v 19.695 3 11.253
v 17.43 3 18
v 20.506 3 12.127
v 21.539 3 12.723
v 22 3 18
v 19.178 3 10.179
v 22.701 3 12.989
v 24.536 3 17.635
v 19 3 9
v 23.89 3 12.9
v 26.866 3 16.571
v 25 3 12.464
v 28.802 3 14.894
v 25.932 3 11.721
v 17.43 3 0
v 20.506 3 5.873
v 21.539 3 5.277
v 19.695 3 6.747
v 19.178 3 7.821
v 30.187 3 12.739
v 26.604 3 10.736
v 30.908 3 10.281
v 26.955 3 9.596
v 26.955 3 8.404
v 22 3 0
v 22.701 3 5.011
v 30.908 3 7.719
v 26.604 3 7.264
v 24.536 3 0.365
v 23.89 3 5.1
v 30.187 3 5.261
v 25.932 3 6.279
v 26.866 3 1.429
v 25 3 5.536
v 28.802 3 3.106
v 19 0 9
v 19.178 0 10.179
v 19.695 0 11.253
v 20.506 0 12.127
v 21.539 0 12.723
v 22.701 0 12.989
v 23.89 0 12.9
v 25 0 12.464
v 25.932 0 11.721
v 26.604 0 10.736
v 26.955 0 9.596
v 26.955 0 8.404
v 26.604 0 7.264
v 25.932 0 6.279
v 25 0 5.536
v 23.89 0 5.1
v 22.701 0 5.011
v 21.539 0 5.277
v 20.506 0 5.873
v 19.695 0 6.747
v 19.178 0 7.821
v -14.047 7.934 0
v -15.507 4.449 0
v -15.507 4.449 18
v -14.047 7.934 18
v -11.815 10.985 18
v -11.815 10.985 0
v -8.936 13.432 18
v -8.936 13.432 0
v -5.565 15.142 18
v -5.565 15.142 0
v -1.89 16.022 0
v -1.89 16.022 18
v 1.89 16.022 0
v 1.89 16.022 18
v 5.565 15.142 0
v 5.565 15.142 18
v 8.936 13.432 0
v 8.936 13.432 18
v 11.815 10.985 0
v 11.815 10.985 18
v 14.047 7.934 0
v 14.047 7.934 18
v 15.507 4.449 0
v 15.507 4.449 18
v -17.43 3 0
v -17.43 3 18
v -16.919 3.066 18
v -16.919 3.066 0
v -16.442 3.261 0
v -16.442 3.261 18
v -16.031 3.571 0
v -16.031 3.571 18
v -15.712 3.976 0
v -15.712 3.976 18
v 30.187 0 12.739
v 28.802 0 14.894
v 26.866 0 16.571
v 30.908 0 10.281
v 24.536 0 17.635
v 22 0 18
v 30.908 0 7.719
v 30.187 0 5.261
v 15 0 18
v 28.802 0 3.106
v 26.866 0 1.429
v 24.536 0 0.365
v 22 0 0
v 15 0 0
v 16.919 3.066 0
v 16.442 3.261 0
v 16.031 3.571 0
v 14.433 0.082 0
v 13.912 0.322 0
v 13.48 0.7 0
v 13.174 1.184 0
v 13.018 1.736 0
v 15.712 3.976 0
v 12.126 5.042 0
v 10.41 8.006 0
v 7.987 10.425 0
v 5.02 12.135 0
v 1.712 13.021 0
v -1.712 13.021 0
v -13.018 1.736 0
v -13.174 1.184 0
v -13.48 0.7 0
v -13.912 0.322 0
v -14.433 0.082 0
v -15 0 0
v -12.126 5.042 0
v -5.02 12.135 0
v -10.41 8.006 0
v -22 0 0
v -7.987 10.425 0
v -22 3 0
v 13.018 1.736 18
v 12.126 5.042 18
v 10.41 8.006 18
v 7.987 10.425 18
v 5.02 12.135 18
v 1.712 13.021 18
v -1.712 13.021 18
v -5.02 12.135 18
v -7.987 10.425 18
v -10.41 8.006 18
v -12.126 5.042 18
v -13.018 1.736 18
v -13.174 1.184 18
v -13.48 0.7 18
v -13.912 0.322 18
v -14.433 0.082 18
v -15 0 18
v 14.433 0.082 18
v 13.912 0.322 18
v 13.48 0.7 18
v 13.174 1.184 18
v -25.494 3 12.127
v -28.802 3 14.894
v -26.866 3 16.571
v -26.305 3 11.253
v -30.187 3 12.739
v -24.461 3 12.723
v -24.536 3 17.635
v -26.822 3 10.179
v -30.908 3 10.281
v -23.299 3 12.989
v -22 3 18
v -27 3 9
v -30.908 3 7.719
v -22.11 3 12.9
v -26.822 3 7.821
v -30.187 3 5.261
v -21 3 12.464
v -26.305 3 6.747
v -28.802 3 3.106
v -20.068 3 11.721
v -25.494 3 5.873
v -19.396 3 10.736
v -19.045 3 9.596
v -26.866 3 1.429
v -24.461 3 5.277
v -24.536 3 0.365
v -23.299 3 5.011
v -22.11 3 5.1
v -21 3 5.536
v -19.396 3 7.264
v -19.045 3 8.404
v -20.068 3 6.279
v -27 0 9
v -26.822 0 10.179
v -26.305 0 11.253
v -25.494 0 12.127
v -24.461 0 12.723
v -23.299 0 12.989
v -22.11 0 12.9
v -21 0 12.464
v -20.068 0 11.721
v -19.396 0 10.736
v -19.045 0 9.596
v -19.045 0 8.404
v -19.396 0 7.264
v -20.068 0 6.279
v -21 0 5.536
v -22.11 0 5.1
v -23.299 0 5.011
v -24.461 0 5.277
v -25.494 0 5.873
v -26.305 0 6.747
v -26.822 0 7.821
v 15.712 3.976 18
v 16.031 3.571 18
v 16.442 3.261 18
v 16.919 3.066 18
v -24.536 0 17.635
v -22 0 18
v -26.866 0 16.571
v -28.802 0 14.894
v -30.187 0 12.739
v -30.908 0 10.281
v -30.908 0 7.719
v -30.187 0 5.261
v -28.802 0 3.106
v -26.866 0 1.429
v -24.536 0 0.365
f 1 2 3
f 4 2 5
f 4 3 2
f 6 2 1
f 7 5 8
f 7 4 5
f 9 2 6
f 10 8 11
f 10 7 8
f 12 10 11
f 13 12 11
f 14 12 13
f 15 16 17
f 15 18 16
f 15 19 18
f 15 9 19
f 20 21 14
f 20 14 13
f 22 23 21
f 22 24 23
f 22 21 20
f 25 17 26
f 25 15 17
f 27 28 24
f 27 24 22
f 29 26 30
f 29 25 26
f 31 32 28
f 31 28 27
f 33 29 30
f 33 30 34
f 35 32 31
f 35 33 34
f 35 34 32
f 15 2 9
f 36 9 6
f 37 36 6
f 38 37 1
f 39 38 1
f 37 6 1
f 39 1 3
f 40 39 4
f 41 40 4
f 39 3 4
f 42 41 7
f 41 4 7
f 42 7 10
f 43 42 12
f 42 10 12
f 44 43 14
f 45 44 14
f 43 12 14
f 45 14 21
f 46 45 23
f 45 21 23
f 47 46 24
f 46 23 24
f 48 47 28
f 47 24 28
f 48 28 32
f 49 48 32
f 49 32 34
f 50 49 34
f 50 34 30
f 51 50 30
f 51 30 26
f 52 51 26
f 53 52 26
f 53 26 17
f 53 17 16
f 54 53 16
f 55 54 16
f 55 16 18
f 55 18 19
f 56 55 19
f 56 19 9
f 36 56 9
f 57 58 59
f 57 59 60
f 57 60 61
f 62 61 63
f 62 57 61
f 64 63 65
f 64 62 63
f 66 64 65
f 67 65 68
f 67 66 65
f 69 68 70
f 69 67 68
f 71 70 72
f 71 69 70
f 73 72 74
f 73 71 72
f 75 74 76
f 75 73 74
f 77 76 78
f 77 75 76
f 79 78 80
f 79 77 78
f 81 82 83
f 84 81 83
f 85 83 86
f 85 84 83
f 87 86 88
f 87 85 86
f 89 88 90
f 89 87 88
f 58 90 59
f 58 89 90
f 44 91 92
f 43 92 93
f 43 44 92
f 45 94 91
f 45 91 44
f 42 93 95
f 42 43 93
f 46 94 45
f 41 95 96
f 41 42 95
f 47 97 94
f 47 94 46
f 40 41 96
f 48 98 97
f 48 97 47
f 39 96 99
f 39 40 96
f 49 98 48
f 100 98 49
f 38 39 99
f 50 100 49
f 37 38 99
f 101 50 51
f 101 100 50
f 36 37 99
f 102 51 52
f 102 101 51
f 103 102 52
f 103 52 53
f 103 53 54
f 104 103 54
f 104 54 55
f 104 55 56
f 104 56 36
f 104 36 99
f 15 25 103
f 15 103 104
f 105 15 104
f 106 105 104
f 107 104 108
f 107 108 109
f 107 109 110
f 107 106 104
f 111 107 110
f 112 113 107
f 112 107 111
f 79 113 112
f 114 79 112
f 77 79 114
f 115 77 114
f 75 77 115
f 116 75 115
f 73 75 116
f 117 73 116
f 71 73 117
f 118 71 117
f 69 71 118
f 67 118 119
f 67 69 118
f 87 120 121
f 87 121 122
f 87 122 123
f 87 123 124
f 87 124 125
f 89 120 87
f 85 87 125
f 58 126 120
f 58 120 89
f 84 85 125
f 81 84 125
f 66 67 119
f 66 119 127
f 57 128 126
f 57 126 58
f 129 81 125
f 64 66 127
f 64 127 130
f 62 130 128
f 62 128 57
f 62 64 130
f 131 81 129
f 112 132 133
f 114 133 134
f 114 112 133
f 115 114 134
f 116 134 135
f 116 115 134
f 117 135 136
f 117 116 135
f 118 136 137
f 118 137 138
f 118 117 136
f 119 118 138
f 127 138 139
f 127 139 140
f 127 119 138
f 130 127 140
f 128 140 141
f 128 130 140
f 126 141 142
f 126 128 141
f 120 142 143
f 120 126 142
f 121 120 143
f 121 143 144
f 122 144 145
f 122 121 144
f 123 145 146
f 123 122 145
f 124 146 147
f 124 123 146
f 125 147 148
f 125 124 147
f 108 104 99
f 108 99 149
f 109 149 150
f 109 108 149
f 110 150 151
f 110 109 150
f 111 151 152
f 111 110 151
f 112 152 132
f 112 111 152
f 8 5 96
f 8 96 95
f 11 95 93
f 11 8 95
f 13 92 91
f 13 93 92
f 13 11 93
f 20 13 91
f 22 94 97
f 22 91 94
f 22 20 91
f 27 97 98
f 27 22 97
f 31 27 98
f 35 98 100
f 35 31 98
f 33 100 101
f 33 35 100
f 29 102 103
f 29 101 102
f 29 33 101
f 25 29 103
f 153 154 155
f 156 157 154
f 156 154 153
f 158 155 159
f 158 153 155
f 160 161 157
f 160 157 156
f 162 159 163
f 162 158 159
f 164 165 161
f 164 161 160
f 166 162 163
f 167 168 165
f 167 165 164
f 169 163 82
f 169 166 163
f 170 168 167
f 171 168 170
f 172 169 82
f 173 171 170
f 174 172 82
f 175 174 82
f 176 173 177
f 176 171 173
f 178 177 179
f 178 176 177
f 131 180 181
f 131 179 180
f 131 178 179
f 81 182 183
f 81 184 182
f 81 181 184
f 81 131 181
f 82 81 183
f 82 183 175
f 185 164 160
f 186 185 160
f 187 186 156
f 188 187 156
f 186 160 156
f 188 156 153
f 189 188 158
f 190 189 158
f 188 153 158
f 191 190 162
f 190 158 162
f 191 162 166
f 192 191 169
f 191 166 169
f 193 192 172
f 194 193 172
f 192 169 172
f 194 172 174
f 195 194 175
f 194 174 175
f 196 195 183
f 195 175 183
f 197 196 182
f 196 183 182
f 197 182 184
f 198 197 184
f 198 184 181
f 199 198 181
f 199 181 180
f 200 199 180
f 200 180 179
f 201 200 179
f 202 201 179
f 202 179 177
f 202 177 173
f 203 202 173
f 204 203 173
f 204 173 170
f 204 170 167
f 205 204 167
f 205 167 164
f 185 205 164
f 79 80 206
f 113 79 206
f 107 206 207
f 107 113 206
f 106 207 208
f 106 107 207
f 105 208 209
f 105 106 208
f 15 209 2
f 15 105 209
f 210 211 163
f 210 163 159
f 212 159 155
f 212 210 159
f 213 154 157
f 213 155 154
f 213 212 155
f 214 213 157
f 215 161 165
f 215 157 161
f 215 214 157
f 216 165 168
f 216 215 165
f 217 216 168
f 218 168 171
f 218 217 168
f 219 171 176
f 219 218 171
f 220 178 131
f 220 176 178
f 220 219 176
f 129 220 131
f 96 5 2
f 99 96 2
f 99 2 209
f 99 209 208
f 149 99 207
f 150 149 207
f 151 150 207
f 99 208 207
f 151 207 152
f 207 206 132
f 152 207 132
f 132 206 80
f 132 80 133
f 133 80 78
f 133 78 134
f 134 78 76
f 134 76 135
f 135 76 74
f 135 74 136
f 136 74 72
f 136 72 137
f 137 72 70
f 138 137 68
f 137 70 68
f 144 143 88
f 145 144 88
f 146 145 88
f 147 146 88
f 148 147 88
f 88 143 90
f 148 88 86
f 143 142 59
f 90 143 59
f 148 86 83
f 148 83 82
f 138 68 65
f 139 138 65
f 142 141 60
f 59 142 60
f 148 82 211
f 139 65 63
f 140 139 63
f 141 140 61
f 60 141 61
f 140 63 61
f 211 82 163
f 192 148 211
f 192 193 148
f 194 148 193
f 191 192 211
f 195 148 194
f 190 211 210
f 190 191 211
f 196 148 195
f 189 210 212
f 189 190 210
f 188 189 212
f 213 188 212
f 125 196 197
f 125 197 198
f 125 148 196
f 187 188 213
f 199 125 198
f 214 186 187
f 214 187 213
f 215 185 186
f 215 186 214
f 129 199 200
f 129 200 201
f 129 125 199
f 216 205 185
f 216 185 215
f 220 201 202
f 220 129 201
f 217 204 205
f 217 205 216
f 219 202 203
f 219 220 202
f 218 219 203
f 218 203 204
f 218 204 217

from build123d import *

# Parameters (mm, degrees)
BOSS_EXTRUDE1_DEPTH = 18
CUT_EXTRUDE1_REACH  = 40.177
SKETCH2_R           = 4
FILLET2_RADIUS      = 9
FILLET2_LENGTH      = 3
FILLET3_RADIUS      = 9
FILLET3_LENGTH      = 3


with BuildPart() as part:
    # Sketch1 → Boss-Extrude1 (new body)
    with BuildSketch(Plane.XY):
        with BuildLine():
            Line((31, 0), (15, 0))
            ThreePointArc((15, 0), (13.682550737, 0.495231765), (13.017544199, 1.73567256))
            ThreePointArc((13.017544199, 1.73567256), (0, 13.13274595), (-13.017544199, 1.73567256))
            ThreePointArc((-13.017544199, 1.73567256), (-13.682550737, 0.495231765), (-15, 0))
            Line((-15, 0), (-31, 0))
            Line((-31, 0), (-31, 3))
            Line((-31, 3), (-17.429758337, 3))
            ThreePointArc((-17.429758337, 3), (-16.226217084, 3.402662073), (-15.507296248, 4.448511548))
            ThreePointArc((-15.507296248, 4.448511548), (0, 16.13274595), (15.507296248, 4.448511548))
            ThreePointArc((15.507296248, 4.448511548), (16.226217084, 3.402662073), (17.429758337, 3))
            Line((17.429758337, 3), (31, 3))
            Line((31, 3), (31, 0))
        make_face()
    extrude(amount=BOSS_EXTRUDE1_DEPTH)

    # Sketch2 → Cut-Extrude1 (cut, up to next)
    with BuildSketch(Plane(origin=(0, 3, 0), x_dir=(1, 0, 0), z_dir=(0, 1, 0)), mode=Mode.PRIVATE) as cut_extrude1_sk1:
        with Locations(Location((-23, -9, 0), (0, 0, 180))):
            Circle(SKETCH2_R)
    cut_extrude1_tool1 = extrude(cut_extrude1_sk1.sketch, amount=-CUT_EXTRUDE1_REACH, mode=Mode.PRIVATE) & part.part
    # Sketch2 → Cut-Extrude1 (cut, up to next)
    with BuildSketch(Plane(origin=(0, 3, 0), x_dir=(1, 0, 0), z_dir=(0, 1, 0)), mode=Mode.PRIVATE) as cut_extrude1_sk2:
        with Locations(Location((23, -9, 0), (0, 0, 180))):
            Circle(SKETCH2_R)
    cut_extrude1_tool2 = extrude(cut_extrude1_sk2.sketch, amount=-CUT_EXTRUDE1_REACH, mode=Mode.PRIVATE) & part.part
    add(cut_extrude1_tool1.solids().sort_by_distance((-23, 3, 9))[0], mode=Mode.SUBTRACT)
    add(cut_extrude1_tool2.solids().sort_by_distance((23, 3, 9))[0], mode=Mode.SUBTRACT)

    # Fillet2: full round fillet: the end face becomes a half cylinder, R = half its width
    fillet2_face = Plane((-31, 1.5, 9), x_dir=(0, -1, 0), z_dir=(-1, 0, 0))  # on the end face: x along it, z out of the body
    fillet2_slab = fillet2_face.offset(-FILLET2_RADIUS / 2) * Box(FILLET2_LENGTH, 2 * FILLET2_RADIUS, FILLET2_RADIUS, mode=Mode.PRIVATE)  # the body's end, R deep
    fillet2_round = Plane((-22, 1.5, 9), x_dir=(-1, 0, 0), z_dir=(0, -1, 0)) * Cylinder(FILLET2_RADIUS, FILLET2_LENGTH, mode=Mode.PRIVATE)  # its axis R under the face
    add(fillet2_slab - fillet2_round, mode=Mode.SUBTRACT)

    # Fillet3: full round fillet: the end face becomes a half cylinder, R = half its width
    fillet3_face = Plane((31, 1.5, 9), x_dir=(0, 1, 0), z_dir=(1, 0, 0))  # on the end face: x along it, z out of the body
    fillet3_slab = fillet3_face.offset(-FILLET3_RADIUS / 2) * Box(FILLET3_LENGTH, 2 * FILLET3_RADIUS, FILLET3_RADIUS, mode=Mode.PRIVATE)  # the body's end, R deep
    fillet3_round = Plane((22, 1.5, 9), x_dir=(1, 0, 0), z_dir=(0, 1, 0)) * Cylinder(FILLET3_RADIUS, FILLET3_LENGTH, mode=Mode.PRIVATE)  # its axis R under the face
    add(fillet3_slab - fillet3_round, mode=Mode.SUBTRACT)


solid = part.part
